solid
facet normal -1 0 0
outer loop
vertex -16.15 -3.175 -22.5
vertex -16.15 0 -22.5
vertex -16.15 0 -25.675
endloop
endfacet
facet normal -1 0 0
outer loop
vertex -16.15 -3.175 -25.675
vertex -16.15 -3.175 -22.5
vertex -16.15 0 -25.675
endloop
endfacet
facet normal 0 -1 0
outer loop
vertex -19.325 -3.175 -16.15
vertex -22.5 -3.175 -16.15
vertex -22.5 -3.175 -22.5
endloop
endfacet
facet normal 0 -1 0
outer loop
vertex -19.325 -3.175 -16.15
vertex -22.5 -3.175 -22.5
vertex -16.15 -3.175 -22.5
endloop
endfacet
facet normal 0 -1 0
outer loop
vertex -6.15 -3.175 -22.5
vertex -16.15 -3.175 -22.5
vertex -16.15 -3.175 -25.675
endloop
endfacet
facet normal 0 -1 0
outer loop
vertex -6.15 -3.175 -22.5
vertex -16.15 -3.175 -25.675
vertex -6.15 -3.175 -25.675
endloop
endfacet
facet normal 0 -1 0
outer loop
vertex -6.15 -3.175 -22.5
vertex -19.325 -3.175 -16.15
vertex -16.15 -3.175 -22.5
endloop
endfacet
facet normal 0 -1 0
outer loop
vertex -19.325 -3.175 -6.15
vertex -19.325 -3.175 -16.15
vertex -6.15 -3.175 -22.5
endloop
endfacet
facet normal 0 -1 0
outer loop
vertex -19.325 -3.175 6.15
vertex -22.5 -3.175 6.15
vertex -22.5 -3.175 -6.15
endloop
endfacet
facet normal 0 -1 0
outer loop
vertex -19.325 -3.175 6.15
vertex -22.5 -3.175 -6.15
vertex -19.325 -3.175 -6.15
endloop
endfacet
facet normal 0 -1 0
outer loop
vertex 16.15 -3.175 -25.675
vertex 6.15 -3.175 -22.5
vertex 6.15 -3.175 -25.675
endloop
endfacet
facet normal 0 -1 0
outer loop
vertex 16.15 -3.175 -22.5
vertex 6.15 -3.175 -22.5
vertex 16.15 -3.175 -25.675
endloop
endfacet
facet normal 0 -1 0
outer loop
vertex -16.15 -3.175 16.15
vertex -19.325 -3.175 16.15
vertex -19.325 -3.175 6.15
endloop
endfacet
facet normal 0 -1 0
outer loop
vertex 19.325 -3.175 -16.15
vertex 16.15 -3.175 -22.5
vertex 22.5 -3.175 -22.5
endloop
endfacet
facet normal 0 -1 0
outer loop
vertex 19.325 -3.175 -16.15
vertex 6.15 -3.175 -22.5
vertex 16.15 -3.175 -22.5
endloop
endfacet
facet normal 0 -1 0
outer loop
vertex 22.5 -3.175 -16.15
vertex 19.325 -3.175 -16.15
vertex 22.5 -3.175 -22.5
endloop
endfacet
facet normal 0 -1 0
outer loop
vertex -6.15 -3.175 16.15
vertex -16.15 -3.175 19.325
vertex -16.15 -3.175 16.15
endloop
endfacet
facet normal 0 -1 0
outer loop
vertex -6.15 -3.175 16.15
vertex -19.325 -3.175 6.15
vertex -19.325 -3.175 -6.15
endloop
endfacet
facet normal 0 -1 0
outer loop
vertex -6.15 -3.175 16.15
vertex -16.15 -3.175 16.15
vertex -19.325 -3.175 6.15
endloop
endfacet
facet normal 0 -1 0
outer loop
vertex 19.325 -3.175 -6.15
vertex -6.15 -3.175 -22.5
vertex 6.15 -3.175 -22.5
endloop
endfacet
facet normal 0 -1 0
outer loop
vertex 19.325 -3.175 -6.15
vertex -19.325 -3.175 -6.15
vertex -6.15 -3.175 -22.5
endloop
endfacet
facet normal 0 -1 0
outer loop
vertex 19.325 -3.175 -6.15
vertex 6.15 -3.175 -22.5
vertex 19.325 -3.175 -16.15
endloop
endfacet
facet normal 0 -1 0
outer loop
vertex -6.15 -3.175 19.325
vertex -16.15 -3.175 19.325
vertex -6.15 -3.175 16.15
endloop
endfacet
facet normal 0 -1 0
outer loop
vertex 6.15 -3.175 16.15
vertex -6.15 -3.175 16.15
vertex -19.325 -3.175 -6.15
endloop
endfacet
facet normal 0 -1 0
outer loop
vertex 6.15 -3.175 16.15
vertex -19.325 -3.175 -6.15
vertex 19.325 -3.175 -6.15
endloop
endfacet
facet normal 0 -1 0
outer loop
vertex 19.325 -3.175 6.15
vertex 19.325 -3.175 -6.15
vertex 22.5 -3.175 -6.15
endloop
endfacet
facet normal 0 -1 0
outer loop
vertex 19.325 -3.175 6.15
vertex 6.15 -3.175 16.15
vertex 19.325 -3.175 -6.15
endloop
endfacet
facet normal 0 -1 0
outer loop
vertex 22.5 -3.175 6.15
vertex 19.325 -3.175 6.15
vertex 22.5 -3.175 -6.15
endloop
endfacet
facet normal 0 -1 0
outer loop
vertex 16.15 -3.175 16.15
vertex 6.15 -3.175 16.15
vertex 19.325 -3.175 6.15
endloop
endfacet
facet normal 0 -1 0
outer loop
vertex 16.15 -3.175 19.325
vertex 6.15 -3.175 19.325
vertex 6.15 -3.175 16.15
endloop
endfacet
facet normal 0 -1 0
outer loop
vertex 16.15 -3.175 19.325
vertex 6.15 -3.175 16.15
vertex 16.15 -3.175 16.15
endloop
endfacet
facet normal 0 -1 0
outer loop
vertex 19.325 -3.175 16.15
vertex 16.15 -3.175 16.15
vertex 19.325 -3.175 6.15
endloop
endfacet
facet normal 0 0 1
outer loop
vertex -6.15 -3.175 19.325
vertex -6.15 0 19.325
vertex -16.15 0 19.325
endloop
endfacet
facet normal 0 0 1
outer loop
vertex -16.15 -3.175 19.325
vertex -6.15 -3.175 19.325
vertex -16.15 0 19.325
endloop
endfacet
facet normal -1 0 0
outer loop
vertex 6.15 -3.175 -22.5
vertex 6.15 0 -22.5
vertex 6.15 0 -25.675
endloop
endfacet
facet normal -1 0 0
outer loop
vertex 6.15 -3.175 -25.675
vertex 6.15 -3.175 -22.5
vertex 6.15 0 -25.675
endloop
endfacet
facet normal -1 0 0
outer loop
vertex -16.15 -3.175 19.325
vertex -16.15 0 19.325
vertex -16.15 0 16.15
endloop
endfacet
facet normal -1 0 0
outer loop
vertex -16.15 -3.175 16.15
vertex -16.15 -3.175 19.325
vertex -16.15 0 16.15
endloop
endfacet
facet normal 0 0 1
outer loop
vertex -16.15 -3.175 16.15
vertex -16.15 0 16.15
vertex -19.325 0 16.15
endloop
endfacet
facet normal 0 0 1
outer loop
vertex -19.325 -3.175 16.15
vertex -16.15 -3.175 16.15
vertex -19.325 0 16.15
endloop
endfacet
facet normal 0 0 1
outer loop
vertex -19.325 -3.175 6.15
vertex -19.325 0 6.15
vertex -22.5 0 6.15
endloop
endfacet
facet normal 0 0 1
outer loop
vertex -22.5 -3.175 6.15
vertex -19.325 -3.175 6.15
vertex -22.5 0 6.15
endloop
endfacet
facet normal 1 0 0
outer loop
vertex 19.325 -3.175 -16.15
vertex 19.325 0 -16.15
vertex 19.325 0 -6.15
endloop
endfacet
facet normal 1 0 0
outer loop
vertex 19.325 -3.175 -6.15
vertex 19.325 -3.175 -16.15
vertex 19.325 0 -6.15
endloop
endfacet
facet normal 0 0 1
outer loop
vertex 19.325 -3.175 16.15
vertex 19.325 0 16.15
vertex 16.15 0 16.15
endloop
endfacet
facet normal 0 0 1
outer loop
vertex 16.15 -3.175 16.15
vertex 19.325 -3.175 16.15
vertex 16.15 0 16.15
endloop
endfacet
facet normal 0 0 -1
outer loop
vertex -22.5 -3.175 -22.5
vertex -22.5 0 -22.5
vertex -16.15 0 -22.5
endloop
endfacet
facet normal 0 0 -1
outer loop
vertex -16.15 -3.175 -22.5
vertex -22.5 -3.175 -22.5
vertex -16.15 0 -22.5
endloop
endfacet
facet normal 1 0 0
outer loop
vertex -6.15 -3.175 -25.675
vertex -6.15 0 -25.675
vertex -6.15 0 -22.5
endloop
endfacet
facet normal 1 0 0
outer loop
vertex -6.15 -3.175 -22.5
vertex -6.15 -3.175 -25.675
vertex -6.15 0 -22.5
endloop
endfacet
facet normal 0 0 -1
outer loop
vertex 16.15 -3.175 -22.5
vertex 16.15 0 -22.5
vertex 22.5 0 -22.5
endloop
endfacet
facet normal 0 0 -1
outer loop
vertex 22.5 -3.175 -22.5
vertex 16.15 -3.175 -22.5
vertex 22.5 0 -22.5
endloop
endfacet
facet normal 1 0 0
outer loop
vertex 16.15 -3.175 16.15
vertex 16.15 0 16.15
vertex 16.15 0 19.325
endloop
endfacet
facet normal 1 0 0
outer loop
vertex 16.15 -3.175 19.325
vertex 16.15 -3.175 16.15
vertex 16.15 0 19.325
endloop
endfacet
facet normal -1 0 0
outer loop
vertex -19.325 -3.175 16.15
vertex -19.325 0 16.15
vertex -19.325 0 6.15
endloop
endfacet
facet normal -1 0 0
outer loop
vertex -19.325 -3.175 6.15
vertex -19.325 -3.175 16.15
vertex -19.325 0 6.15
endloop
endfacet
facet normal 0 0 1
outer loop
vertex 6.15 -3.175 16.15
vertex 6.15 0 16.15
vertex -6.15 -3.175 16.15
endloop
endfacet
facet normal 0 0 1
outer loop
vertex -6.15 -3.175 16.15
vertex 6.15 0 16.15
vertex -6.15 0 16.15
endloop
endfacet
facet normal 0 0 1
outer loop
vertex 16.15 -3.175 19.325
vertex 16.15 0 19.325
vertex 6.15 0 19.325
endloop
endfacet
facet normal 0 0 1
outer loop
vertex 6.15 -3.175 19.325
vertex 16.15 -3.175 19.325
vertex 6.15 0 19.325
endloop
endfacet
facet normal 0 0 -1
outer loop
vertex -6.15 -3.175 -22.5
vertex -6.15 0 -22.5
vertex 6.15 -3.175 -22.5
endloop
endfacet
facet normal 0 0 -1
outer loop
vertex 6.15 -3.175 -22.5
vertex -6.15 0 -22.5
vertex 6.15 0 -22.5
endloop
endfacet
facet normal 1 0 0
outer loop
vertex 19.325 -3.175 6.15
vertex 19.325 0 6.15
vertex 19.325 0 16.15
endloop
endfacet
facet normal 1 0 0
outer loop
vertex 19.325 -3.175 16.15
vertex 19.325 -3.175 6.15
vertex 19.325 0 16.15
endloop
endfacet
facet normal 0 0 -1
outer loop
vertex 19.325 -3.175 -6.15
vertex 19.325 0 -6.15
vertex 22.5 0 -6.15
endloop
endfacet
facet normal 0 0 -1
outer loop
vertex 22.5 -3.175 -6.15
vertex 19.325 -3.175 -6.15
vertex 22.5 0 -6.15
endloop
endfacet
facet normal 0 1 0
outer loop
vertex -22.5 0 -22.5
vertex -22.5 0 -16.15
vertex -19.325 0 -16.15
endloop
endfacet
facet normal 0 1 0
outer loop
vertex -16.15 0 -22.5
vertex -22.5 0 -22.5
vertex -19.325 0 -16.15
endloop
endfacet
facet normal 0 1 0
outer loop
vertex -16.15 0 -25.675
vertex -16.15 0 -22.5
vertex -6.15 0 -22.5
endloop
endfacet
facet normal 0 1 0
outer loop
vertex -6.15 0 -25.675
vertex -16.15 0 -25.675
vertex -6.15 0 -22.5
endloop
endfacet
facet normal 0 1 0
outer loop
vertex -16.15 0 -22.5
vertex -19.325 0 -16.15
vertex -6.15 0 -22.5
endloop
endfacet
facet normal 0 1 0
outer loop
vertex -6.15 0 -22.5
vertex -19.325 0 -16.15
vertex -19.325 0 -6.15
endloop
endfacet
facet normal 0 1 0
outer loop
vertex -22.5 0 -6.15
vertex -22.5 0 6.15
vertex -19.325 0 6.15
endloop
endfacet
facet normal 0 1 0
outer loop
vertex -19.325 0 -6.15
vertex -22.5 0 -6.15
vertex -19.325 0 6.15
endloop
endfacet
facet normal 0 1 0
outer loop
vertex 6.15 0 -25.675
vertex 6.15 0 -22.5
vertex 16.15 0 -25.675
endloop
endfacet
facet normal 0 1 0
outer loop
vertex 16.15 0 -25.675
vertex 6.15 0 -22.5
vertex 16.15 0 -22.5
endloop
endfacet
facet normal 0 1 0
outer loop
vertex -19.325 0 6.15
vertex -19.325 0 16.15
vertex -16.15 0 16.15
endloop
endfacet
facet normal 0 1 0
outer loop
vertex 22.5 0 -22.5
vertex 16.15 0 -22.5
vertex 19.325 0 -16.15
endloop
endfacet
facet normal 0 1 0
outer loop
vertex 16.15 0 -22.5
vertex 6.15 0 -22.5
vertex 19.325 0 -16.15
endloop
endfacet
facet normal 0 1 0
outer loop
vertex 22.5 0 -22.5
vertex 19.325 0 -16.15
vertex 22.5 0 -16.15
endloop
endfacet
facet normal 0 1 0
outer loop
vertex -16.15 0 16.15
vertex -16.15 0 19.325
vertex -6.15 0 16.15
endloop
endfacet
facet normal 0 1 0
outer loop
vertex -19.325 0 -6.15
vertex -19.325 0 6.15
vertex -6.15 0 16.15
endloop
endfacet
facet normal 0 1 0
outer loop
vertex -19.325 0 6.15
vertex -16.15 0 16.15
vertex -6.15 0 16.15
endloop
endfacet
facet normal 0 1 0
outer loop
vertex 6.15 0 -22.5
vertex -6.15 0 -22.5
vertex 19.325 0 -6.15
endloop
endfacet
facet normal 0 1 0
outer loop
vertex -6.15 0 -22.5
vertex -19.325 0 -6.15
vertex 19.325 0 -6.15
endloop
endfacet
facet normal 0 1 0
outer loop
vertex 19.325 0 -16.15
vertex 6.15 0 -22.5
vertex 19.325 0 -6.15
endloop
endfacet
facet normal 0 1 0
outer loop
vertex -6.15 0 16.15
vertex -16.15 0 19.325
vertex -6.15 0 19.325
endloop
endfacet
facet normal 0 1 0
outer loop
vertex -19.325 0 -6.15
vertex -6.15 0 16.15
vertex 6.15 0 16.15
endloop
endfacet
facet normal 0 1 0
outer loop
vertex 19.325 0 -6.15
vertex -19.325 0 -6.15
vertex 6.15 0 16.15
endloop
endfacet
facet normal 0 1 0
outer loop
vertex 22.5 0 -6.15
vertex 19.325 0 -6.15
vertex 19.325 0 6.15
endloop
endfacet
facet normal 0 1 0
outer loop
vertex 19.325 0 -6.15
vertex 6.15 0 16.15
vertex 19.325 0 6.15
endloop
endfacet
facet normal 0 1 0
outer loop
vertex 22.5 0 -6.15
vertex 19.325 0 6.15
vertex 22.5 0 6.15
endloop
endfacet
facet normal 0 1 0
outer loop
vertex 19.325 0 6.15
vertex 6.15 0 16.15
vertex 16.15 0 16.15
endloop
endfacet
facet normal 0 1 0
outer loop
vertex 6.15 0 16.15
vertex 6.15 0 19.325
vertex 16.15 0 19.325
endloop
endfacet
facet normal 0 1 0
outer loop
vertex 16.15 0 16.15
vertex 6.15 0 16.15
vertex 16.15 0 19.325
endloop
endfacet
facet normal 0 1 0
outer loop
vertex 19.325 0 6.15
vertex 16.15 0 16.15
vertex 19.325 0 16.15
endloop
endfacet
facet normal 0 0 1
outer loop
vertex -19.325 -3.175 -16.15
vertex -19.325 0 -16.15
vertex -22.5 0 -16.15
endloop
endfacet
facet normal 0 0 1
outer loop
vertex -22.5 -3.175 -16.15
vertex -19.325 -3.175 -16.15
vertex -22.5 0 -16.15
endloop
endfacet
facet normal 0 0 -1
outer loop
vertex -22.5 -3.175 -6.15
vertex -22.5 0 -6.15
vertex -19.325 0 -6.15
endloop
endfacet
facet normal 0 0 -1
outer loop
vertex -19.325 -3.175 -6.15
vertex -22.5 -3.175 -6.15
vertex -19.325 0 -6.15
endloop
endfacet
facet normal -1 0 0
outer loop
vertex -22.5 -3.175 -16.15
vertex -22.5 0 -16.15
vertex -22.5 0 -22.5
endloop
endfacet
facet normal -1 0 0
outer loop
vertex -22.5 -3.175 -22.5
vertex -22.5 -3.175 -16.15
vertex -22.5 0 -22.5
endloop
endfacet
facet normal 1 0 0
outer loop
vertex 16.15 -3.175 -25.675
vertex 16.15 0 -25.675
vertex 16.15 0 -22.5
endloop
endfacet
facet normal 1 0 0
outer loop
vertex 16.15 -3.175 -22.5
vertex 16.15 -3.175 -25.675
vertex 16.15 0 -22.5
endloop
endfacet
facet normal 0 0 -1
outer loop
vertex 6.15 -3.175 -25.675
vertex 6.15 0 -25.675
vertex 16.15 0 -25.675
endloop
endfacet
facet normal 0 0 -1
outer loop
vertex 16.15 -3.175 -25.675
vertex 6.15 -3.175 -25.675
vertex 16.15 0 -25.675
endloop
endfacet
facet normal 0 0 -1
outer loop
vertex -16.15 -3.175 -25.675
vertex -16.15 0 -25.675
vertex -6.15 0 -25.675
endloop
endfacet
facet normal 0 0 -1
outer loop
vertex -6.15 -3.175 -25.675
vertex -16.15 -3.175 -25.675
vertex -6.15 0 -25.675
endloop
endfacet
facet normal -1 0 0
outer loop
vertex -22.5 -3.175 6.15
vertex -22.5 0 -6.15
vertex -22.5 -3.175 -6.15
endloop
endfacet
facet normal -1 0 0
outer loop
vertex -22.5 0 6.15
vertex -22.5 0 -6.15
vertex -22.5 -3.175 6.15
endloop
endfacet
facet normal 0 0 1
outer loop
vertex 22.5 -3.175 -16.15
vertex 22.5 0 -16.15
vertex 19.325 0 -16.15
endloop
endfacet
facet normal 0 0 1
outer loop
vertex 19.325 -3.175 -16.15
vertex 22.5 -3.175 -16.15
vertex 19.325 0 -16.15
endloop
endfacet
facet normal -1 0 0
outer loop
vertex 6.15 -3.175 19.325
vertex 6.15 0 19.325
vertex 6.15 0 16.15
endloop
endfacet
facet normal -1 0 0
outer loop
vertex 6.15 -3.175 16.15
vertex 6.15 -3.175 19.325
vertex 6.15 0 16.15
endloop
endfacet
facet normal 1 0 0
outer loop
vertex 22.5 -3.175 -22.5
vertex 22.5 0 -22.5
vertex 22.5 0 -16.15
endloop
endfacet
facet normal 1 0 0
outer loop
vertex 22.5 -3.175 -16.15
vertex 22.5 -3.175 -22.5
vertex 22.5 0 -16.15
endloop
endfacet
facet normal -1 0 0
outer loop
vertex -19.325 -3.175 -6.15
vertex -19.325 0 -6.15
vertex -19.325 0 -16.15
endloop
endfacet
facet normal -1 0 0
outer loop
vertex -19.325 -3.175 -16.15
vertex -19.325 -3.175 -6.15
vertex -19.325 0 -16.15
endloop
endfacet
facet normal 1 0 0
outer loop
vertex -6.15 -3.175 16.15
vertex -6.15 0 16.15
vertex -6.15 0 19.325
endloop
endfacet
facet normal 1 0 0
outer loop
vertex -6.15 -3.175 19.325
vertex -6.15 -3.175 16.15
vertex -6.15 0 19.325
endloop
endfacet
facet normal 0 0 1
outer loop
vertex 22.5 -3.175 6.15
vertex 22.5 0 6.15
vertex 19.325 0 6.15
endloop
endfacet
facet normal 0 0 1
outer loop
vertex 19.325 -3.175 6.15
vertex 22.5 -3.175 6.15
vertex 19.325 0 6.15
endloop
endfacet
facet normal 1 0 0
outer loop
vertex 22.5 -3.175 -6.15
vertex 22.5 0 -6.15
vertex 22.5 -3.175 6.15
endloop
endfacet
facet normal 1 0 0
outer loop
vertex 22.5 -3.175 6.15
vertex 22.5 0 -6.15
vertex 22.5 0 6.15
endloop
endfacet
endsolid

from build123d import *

# Parameters (mm, degrees)
F0_W     = 1.5875
F0_H     = 12.3
F1_DEPTH = 3.175


# Not quite as in the source:
# - a length typed as a fraction of an inch, garbled in the dataset ("3 / 203.2 mm" for 3/8 in), is restored
# - a feature names something its author has since deleted; it is built from what else it names


with BuildPart() as f1:
    # F0 (on Front) → F1 (new body)
    with BuildSketch(Plane.XZ):
        with Locations((21.70625, 0)):
            Rectangle(F0_W, F0_H)
        with Locations((-21.70625, 0)):
            Rectangle(F0_W, F0_H)
        Polygon((-22.5, -16.15), (-22.5, -22.5), (-16.15, -22.5), (-16.15, -25.675), (-6.15, -25.675), (-6.15, -22.5), (6.15, -22.5), (6.15, -25.675), (16.15, -25.675), (16.15, -22.5), (22.5, -22.5), (22.5, -16.15), (19.325, -16.15), (19.325, -6.15), (20.9125, -6.15), (20.9125, 6.15), (19.325, 6.15), (19.325, 16.15), (16.15, 16.15), (16.15, 19.325), (6.15, 19.325), (6.15, 16.15), (-6.15, 16.15), (-6.15, 19.325), (-16.15, 19.325), (-16.15, 16.15), (-19.325, 16.15), (-19.325, 6.15), (-20.9125, 6.15), (-20.9125, -6.15), (-19.325, -6.15), (-19.325, -16.15), align=None)
    extrude(amount=F1_DEPTH)


solid = f1.part
